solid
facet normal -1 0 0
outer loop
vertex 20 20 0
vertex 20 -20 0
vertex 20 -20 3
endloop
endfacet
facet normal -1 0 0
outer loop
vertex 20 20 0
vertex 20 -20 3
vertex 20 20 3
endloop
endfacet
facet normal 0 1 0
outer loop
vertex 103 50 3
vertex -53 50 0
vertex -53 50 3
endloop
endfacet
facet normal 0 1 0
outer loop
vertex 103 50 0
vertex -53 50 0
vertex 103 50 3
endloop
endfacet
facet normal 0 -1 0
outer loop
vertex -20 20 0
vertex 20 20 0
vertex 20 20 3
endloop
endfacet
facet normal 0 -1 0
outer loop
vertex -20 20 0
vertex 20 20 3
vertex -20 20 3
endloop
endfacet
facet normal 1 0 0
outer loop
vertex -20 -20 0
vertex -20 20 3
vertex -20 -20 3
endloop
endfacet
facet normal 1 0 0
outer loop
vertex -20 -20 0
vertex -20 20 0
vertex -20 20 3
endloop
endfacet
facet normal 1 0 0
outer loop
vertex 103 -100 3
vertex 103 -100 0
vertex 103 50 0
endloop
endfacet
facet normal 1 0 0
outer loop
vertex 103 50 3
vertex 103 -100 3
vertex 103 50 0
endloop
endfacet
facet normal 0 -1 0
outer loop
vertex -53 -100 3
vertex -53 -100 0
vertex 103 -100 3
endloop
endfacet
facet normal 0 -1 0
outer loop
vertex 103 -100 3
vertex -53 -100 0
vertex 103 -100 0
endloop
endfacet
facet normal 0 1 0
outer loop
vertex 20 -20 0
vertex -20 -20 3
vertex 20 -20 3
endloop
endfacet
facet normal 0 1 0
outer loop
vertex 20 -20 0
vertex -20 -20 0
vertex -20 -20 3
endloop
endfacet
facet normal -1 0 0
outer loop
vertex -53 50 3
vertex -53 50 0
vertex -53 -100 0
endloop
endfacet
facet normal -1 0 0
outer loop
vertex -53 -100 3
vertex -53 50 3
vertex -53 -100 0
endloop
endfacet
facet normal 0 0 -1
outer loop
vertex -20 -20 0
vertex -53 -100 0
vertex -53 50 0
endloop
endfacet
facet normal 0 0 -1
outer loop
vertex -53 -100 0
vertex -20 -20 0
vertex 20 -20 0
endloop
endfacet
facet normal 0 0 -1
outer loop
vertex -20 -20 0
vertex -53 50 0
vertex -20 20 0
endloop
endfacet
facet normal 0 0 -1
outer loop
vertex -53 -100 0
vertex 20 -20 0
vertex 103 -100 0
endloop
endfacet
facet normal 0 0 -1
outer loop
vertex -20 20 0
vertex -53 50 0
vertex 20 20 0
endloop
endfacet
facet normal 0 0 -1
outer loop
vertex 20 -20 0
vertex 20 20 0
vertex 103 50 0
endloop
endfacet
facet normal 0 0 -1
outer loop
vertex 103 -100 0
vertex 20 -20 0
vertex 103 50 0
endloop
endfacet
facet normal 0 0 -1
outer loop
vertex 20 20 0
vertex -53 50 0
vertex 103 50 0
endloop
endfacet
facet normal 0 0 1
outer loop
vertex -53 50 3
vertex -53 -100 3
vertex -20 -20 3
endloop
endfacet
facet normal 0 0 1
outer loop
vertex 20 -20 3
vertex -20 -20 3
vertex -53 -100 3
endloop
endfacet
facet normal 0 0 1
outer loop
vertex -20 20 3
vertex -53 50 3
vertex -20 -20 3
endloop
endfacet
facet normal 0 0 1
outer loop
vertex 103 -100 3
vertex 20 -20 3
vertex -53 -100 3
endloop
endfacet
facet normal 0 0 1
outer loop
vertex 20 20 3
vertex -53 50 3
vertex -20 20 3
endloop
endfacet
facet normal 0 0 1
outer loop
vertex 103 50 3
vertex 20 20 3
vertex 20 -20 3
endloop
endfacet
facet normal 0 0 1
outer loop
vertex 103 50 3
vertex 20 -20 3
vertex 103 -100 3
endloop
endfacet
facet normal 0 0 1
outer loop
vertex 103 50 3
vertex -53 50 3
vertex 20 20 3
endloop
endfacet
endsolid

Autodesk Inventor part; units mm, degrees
ref_plane "YZ Plane" through (0, 0, 0) normal (1, 0, 0) x (0, 1, 0)
ref_plane "XZ Plane" through (0, 0, 0) normal (0, 1, 0) x (-1, 0, 0)
ref_plane "XY Plane" through (0, 0, 0) normal (0, 0, 1) x (1, 0, 0)
sketch "Sketch1" plane through (0, 0, 0) normal (0, 0, 1) x (1, 0, 0)
  line L0 (-53, 50) -> (103, 50)
  line L1 (-53, 50) -> (-53, -100)
  line L2 (-53, -100) -> (103, -100)
  line L3 (103, -100) -> (103, 50)
  line L4 (0, 0) -> (-53, 0)
  line L5 (0, 0) -> (25, 50)
  line L6 (103, 50) -> (23, 50)
  line L7 (-20, -20) -> (20, -20)
  line L8 (20, -20) -> (20, 20)
  line L9 (20, 20) -> (-20, 20)
  line L10 (-20, 20) -> (-20, -20)
  line L11 (-20, -20) -> (20, 20) construction
  line L12 (20, -20) -> (-20, 20) construction
  dimension "d0" = 156
  dimension "d1" = 150
sketch "Sketch2" plane through (0, 0, 0) normal (0, 0, 1) x (1, 0, 0)
  point P0 (0, 0)
extrude "Extrusion1" add sketch "Sketch1" along normal blind 3
sketch "Sketch3" plane through (103, -100, 0) normal (1, 0, 0) x (0, 0, -1)
  point P0 (0, 100)
sketch "Sketch4" plane through (0, 0, 0) normal (0, 0, 1) x (1, 0, 0)
  point P0 (0, 0)
extrude "Extrusion3" cut sketch "Sketch1" along normal blind 10 contours L10 L9 L5 L4 | L4 L5 L9 L8 L7 L10
properties part number "box bottom"
